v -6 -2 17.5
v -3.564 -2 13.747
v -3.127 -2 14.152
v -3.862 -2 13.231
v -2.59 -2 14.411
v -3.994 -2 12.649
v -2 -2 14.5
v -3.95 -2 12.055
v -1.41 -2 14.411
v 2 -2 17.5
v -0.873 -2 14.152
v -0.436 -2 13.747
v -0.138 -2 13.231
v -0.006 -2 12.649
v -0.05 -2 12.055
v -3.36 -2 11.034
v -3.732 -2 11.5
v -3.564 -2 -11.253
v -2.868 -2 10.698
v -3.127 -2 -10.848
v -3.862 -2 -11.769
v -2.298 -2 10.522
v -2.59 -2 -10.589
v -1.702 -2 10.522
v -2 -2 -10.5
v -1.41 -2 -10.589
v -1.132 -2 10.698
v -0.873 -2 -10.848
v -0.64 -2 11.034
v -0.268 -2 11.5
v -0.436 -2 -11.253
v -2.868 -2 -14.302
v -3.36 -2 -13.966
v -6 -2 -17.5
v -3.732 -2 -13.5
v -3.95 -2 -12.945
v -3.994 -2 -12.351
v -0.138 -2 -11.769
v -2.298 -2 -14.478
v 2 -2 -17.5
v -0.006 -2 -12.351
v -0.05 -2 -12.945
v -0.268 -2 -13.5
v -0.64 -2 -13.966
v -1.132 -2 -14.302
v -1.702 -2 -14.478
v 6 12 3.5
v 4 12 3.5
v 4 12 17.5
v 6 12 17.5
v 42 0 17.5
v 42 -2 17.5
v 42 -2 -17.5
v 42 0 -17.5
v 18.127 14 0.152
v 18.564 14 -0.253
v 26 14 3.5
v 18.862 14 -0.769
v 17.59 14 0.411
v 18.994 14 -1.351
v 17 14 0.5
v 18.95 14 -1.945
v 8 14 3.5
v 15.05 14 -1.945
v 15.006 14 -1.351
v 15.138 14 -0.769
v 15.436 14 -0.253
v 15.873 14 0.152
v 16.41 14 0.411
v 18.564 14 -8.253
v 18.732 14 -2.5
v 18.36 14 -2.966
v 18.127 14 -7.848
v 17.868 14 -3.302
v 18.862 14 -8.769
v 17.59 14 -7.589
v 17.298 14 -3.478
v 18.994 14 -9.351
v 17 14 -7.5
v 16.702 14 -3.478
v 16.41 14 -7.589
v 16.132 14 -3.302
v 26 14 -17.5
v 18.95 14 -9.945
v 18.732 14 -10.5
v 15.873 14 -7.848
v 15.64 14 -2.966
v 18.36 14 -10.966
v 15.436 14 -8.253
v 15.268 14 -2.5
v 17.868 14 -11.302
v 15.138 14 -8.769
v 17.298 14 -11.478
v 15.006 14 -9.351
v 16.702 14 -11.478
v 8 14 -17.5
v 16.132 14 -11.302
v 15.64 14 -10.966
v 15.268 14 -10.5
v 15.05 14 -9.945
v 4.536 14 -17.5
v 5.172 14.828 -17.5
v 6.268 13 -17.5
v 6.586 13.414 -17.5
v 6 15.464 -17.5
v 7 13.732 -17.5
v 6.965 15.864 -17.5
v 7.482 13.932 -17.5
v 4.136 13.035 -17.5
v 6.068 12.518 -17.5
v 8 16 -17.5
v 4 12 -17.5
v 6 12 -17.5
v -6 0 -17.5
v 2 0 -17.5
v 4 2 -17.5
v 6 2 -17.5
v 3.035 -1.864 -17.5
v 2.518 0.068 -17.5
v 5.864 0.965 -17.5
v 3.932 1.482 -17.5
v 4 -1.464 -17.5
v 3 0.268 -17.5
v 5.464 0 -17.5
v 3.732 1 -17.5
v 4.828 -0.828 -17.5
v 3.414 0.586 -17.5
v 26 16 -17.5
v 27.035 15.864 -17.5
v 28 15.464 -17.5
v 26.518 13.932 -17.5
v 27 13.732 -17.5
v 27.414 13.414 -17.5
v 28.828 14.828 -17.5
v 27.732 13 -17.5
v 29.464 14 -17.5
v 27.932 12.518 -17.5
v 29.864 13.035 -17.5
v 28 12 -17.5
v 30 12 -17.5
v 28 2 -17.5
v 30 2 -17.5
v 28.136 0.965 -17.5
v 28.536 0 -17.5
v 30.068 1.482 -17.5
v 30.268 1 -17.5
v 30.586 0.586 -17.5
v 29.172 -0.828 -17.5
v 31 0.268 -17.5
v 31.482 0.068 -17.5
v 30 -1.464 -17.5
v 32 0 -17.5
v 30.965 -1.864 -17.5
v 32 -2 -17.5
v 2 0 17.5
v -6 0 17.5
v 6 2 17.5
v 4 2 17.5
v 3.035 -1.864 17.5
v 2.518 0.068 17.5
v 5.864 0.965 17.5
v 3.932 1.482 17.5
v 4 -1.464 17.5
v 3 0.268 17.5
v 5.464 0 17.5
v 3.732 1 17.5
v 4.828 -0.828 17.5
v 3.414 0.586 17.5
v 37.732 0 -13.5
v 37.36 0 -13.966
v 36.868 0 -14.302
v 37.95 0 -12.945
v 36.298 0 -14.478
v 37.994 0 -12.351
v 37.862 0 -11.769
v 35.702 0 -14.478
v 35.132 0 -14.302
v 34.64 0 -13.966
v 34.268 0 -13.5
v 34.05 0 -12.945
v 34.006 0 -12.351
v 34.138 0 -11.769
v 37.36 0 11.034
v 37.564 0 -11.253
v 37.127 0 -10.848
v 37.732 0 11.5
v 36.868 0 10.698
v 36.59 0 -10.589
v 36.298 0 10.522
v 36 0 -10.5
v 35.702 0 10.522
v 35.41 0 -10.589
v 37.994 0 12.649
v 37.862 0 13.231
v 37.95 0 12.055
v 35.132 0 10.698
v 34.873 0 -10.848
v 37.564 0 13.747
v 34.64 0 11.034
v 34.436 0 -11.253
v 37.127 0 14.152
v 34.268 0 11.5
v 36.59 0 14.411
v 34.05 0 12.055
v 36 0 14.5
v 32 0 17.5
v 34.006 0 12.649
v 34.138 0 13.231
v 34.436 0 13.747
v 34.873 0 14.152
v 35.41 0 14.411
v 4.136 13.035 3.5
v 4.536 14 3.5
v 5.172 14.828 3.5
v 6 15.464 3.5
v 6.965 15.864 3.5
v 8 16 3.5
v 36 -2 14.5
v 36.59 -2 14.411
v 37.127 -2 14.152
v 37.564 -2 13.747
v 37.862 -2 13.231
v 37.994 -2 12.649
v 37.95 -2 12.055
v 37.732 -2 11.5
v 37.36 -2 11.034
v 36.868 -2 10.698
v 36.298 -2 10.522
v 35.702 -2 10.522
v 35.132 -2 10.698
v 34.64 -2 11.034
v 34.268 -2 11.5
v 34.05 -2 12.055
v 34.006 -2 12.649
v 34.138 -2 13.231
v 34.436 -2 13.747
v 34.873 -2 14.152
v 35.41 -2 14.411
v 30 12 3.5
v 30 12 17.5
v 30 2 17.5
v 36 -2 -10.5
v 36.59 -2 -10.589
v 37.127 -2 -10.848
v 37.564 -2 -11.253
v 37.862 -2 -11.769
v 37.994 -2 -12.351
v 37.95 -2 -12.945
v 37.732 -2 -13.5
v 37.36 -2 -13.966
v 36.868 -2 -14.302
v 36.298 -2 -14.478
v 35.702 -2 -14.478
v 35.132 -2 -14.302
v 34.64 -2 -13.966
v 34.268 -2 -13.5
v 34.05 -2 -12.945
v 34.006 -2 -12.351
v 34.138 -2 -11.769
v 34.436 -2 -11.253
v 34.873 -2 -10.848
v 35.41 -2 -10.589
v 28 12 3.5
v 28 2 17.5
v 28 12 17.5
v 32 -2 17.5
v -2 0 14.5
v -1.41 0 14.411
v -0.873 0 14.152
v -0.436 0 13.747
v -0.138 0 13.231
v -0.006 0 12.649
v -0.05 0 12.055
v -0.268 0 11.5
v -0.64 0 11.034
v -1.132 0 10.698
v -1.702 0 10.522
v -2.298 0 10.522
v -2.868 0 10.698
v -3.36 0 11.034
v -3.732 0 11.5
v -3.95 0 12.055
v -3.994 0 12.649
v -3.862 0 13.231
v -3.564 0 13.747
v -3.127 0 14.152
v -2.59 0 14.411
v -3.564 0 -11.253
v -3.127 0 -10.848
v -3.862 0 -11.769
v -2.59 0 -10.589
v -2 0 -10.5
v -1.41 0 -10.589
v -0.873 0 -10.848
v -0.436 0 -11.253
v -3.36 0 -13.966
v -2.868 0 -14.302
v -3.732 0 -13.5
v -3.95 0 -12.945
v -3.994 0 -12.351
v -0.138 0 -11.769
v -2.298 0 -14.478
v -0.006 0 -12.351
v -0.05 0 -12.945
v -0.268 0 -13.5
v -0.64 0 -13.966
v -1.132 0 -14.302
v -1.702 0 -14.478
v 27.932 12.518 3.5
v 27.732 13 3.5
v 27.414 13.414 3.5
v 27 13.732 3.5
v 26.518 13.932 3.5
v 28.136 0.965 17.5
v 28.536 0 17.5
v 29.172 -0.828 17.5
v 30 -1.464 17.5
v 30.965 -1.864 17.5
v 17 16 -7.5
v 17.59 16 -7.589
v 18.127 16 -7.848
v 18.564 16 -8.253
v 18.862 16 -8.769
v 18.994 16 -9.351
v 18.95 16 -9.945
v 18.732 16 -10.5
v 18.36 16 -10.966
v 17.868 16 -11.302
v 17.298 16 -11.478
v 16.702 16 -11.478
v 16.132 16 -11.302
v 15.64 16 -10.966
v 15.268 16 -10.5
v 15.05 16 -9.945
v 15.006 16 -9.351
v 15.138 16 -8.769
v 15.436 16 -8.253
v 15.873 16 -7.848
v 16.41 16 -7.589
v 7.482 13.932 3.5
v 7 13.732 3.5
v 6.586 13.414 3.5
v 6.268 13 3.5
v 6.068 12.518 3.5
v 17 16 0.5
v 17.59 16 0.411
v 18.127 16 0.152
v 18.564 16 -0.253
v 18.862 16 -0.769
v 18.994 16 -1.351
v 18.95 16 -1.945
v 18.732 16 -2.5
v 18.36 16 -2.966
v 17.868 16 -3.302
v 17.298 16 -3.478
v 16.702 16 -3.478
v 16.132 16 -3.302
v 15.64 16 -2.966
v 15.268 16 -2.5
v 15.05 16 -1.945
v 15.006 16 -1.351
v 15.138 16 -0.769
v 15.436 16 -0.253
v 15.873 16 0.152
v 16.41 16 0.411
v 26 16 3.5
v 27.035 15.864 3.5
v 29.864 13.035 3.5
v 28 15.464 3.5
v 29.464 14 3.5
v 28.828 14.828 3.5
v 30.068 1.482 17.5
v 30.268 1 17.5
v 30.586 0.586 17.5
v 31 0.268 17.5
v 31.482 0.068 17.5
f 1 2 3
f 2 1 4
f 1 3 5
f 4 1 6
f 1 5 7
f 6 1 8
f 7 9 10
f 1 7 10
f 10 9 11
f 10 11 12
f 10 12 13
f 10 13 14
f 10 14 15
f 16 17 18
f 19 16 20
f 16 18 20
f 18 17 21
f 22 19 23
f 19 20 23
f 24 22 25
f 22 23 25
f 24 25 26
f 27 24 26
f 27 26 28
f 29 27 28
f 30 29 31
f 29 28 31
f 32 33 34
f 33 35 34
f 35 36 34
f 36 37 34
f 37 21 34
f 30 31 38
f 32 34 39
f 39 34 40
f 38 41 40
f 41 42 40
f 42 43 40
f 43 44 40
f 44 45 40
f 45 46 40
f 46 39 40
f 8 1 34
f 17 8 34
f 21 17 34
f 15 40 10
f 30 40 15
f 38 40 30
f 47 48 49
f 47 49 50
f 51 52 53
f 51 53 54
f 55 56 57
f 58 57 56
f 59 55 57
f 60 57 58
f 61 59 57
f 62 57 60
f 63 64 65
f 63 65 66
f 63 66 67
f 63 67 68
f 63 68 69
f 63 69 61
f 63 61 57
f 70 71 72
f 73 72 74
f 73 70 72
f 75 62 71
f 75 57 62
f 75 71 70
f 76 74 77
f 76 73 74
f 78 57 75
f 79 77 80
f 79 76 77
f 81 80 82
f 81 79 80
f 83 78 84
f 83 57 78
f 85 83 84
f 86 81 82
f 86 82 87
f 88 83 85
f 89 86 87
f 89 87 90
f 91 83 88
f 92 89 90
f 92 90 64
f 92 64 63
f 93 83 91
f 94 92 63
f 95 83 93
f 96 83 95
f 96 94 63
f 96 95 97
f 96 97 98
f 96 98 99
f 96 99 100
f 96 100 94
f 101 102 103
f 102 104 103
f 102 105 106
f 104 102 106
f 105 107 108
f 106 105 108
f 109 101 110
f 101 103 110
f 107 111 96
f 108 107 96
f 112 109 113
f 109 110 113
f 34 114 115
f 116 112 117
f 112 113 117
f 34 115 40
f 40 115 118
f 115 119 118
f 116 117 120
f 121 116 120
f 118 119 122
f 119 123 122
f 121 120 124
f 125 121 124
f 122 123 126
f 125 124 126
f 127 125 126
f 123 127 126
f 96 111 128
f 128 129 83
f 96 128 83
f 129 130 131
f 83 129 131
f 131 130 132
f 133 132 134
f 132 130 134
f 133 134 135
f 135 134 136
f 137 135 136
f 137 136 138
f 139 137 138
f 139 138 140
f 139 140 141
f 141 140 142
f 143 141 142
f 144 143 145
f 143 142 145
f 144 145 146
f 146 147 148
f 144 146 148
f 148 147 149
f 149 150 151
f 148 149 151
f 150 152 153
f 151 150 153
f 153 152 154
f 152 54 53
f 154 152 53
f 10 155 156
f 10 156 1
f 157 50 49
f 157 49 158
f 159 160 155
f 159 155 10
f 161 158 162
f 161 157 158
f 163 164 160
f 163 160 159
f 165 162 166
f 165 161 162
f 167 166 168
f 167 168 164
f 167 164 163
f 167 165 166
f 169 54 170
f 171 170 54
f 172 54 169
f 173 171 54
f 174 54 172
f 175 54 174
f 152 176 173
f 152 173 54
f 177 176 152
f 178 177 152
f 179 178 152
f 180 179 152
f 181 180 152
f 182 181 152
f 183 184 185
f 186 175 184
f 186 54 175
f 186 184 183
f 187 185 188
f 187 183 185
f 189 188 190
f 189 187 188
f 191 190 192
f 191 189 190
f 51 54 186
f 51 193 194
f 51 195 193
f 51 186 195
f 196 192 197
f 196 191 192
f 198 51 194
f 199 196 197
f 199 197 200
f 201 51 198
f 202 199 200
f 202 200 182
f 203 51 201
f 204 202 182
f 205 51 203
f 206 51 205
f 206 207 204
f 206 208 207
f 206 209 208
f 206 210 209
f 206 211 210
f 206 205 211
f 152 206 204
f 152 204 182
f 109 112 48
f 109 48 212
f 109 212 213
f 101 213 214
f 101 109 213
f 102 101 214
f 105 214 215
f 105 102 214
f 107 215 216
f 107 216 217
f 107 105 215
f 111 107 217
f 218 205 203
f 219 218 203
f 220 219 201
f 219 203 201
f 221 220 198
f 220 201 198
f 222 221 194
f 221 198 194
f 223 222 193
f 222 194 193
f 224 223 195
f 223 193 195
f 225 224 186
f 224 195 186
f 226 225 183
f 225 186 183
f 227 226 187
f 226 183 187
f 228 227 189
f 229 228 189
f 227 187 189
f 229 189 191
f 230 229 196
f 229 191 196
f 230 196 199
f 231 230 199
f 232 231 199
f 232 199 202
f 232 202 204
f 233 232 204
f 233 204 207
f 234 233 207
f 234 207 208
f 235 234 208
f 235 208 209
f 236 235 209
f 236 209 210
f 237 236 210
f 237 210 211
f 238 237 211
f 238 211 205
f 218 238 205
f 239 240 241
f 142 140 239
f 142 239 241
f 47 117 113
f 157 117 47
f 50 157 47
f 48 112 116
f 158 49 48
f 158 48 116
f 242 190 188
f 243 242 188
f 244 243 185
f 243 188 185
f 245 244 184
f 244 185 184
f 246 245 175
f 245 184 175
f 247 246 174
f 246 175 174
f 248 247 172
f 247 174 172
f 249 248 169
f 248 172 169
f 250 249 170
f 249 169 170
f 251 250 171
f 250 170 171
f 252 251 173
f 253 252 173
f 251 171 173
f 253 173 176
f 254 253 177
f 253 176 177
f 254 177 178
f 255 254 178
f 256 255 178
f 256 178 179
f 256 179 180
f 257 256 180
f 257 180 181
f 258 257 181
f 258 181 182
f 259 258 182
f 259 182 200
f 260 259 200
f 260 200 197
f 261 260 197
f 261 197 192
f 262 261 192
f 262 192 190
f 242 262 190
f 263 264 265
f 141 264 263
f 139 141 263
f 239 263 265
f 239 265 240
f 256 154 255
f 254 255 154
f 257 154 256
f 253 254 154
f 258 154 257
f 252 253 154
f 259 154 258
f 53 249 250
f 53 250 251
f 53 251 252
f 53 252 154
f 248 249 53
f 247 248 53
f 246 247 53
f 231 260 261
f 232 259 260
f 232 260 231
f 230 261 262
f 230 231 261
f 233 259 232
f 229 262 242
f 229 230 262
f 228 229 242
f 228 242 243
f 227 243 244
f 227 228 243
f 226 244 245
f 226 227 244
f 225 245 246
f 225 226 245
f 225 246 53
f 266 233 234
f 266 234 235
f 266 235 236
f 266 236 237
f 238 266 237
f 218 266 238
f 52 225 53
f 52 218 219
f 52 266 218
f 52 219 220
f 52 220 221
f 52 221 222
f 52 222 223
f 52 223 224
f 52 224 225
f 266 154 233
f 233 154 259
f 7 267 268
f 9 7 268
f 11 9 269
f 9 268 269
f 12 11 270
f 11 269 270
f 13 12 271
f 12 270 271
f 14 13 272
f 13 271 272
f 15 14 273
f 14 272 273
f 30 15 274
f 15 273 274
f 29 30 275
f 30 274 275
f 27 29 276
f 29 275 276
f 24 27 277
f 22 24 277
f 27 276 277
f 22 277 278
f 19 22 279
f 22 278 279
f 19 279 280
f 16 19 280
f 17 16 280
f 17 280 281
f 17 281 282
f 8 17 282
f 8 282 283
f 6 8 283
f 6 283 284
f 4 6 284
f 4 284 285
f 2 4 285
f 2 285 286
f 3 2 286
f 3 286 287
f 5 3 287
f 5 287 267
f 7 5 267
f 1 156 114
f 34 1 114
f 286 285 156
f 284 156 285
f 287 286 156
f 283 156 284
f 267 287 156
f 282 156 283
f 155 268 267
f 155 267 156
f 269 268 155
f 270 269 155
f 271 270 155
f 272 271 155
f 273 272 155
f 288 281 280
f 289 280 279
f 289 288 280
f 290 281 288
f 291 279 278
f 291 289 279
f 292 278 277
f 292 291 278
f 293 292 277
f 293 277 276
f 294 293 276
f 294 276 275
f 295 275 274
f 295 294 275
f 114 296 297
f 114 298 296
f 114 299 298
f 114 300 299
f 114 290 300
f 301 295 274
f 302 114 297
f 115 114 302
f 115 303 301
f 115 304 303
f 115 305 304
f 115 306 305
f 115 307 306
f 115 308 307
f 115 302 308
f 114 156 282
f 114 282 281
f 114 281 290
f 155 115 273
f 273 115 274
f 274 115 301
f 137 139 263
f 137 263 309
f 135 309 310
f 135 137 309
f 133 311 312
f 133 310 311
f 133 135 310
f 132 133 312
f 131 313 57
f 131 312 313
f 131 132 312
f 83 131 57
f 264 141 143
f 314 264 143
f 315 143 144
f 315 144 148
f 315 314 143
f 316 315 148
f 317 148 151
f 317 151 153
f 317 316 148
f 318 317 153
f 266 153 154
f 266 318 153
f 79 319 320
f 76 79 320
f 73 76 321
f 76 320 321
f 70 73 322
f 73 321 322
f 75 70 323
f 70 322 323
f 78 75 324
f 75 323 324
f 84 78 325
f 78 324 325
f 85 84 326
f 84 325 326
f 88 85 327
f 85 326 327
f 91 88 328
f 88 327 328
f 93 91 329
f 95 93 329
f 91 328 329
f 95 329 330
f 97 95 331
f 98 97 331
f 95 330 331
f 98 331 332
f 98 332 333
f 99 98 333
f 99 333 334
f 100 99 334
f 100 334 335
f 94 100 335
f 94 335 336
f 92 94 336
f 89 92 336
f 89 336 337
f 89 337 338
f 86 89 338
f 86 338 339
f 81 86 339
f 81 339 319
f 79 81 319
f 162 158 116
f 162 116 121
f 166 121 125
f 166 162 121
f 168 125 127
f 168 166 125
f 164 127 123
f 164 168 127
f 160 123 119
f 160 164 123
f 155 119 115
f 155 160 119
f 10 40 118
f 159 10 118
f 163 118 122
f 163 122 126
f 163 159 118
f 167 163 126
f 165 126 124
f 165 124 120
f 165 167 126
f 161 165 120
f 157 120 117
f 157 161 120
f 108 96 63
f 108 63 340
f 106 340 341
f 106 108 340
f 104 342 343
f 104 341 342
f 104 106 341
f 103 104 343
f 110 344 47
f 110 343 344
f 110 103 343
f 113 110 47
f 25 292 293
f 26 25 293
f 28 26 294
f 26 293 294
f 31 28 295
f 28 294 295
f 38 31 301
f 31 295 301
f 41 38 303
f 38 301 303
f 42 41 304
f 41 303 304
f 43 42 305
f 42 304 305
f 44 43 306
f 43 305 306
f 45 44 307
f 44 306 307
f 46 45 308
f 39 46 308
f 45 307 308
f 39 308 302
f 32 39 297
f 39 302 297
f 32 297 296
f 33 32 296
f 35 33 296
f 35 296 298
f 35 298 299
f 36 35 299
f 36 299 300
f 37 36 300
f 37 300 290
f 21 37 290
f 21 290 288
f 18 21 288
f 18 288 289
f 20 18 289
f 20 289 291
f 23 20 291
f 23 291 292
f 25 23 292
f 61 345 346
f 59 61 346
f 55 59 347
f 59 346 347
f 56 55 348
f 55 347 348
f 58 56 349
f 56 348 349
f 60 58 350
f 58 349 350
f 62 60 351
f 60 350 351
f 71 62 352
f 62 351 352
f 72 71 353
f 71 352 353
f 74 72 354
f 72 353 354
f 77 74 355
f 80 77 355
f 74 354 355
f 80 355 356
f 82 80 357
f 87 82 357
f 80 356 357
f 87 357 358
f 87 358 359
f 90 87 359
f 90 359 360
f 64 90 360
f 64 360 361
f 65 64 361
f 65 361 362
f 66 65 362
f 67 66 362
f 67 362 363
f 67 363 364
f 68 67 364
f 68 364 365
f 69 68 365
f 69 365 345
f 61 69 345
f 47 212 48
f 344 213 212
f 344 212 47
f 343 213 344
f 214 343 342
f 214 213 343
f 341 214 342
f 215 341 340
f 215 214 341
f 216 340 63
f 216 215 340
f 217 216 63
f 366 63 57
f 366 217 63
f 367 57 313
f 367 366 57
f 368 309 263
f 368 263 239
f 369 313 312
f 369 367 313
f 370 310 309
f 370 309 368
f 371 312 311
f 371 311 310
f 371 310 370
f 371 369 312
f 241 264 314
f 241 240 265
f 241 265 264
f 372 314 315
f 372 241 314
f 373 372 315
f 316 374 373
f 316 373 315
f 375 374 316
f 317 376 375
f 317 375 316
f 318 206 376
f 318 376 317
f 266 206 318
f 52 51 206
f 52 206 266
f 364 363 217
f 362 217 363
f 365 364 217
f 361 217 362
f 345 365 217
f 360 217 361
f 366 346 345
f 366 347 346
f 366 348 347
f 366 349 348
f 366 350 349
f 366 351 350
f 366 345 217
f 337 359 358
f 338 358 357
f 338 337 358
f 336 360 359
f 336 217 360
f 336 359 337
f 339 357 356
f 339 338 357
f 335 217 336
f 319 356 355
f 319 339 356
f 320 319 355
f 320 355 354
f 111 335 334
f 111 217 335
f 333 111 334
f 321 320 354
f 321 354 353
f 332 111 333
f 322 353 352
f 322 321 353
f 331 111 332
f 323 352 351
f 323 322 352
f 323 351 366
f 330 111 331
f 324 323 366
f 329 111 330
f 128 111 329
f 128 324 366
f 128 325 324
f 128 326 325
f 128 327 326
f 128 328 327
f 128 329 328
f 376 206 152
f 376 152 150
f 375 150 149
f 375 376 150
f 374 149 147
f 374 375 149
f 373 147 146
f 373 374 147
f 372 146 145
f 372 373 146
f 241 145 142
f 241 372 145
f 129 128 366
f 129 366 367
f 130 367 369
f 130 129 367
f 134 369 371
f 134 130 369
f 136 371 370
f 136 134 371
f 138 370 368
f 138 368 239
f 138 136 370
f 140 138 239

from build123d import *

# Parameters (mm, degrees)
SKETCH1_W                    = 12
SKETCH1_H                    = 35
BASE_FLANGE1_DEPTH           = 2
EDGE_FLANGE1_STRIP_W         = 12
EDGE_FLANGE1_STRIP_H         = 2
EDGE_FLANGE1_STRIP_CUT_DEPTH = 35
EDGE_FLANGE1_DEPTH           = 35
EDGE_FLANGE2_STRIP_W         = 12
EDGE_FLANGE2_STRIP_H         = 2
EDGE_FLANGE2_STRIP_CUT_DEPTH = 35
EDGE_FLANGE2_DEPTH           = 35
EDGE_FLANGE3_STRIP_W         = 12
EDGE_FLANGE3_STRIP_H         = 2
EDGE_FLANGE3_STRIP_CUT_DEPTH = 35
EDGE_FLANGE3_DEPTH           = 35
EDGE_FLANGE4_STRIP_W         = 12
EDGE_FLANGE4_STRIP_H         = 2
EDGE_FLANGE4_STRIP_CUT_DEPTH = 35
EDGE_FLANGE4_DEPTH           = 35
SKETCH18_W                   = 30
SKETCH18_H                   = 14
CUT_EXTRUDE1_DEPTH           = 4
SKETCH19_R                   = 2
CUT_EXTRUDE2_DEPTH           = 49.231213959
SKETCH20_R                   = 2
CUT_EXTRUDE4_DEPTH           = 49.931073971


# Sheet-metal steps are written as plain solids
with BuildPart() as part:
    # Sketch1 → Base-Flange1 (new body)
    with BuildSketch(Plane(origin=(0, 0, 0), x_dir=(1, 0, 0), z_dir=(0, 1, 0))):
        Rectangle(SKETCH1_W, SKETCH1_H)
    extrude(amount=-BASE_FLANGE1_DEPTH)

    # Edge-Flange1 strip (across the edge) → Edge-Flange1 strip cut (cut)
    with BuildSketch(Plane(origin=(6, 0, 17.5), x_dir=(-1, 0, 0), z_dir=(0, 0, -1))):
        with Locations((-2, -1)):
            Rectangle(EDGE_FLANGE1_STRIP_W, EDGE_FLANGE1_STRIP_H)
    extrude(amount=EDGE_FLANGE1_STRIP_CUT_DEPTH, mode=Mode.SUBTRACT)

    # Edge-Flange1 section (across the edge) → Edge-Flange1 (add)
    with BuildSketch(Plane(origin=(6, 0, 17.5), x_dir=(-1, 0, 0), z_dir=(0, 0, -1))):
        with BuildLine():
            Line((0, 2), (0, 16))
            Line((0, 16), (2, 16))
            Line((2, 16), (2, 2))
            ThreePointArc((2, 2), (2.585786438, 0.585786438), (4, 0))
            Line((4, 0), (4, -2))
            ThreePointArc((4, -2), (1.171572875, -0.828427125), (0, 2))
        make_face()
    extrude(amount=EDGE_FLANGE1_DEPTH)

    # Edge-Flange2 strip (across the edge) → Edge-Flange2 strip cut (cut)
    with BuildSketch(Plane(origin=(6, 16, -17.5), x_dir=(0, -1, 0), z_dir=(0, 0, 1))):
        with Locations((-2, -1)):
            Rectangle(EDGE_FLANGE2_STRIP_W, EDGE_FLANGE2_STRIP_H)
    extrude(amount=EDGE_FLANGE2_STRIP_CUT_DEPTH, mode=Mode.SUBTRACT)

    # Edge-Flange2 section (across the edge) → Edge-Flange2 (add)
    with BuildSketch(Plane(origin=(6, 16, -17.5), x_dir=(0, -1, 0), z_dir=(0, 0, 1))):
        with BuildLine():
            Line((0, 2), (0, 24))
            Line((0, 24), (2, 24))
            Line((2, 24), (2, 2))
            ThreePointArc((2, 2), (2.585786438, 0.585786438), (4, 0))
            Line((4, 0), (4, -2))
            ThreePointArc((4, -2), (1.171572875, -0.828427125), (0, 2))
        make_face()
    extrude(amount=EDGE_FLANGE2_DEPTH)

    # Edge-Flange3 strip (across the edge) → Edge-Flange3 strip cut (cut)
    with BuildSketch(Plane(origin=(30, 14, -17.5), x_dir=(-1, 0, 0), z_dir=(0, 0, 1))):
        with Locations((-2, -1)):
            Rectangle(EDGE_FLANGE3_STRIP_W, EDGE_FLANGE3_STRIP_H)
    extrude(amount=EDGE_FLANGE3_STRIP_CUT_DEPTH, mode=Mode.SUBTRACT)

    # Edge-Flange3 section (across the edge) → Edge-Flange3 (add)
    with BuildSketch(Plane(origin=(30, 14, -17.5), x_dir=(-1, 0, 0), z_dir=(0, 0, 1))):
        with BuildLine():
            Line((0, 2), (0, 16))
            Line((0, 16), (2, 16))
            Line((2, 16), (2, 2))
            ThreePointArc((2, 2), (2.585786438, 0.585786438), (4, 0))
            Line((4, 0), (4, -2))
            ThreePointArc((4, -2), (1.171572875, -0.828427125), (0, 2))
        make_face()
    extrude(amount=EDGE_FLANGE3_DEPTH)

    # Edge-Flange4 strip (across the edge) → Edge-Flange4 strip cut (cut)
    with BuildSketch(Plane(origin=(30, -2, 17.5), x_dir=(0, 1, 0), z_dir=(0, 0, -1))):
        with Locations((-2, -1)):
            Rectangle(EDGE_FLANGE4_STRIP_W, EDGE_FLANGE4_STRIP_H)
    extrude(amount=EDGE_FLANGE4_STRIP_CUT_DEPTH, mode=Mode.SUBTRACT)

    # Edge-Flange4 section (across the edge) → Edge-Flange4 (add)
    with BuildSketch(Plane(origin=(30, -2, 17.5), x_dir=(0, 1, 0), z_dir=(0, 0, -1))):
        with BuildLine():
            Line((0, 2), (0, 12))
            Line((0, 12), (2, 12))
            Line((2, 12), (2, 2))
            ThreePointArc((2, 2), (2.585786438, 0.585786438), (4, 0))
            Line((4, 0), (4, -2))
            ThreePointArc((4, -2), (1.171572875, -0.828427125), (0, 2))
        make_face()
    extrude(amount=EDGE_FLANGE4_DEPTH)

    # Sketch18 → Cut-Extrude1 (cut)
    with BuildSketch(Plane(origin=(0, 16, 0), x_dir=(1, 0, 0), z_dir=(0, 1, 0))):
        with Locations((17, -10.5)):
            Rectangle(SKETCH18_W, SKETCH18_H)
    extrude(amount=-CUT_EXTRUDE1_DEPTH, mode=Mode.SUBTRACT)

    # Sketch19 → Cut-Extrude2 (cut, through all)
    with BuildSketch(Plane(origin=(0, 0, 0), x_dir=(1, 0, 0), z_dir=(0, 1, 0))):
        with Locations(Location((-2, 12.5, 0), (0, 0, 270))):
            Circle(SKETCH19_R)
        with Locations(Location((-2, -12.5, 0), (0, 0, 270))):
            Circle(SKETCH19_R)
        with Locations(Location((36, 12.5, 0), (0, 0, 270))):
            Circle(SKETCH19_R)
        with Locations(Location((36, -12.5, 0), (0, 0, 270))):
            Circle(SKETCH19_R)
    extrude(amount=-CUT_EXTRUDE2_DEPTH, mode=Mode.SUBTRACT)

    # Sketch20 → Cut-Extrude4 (cut, through all)
    with BuildSketch(Plane(origin=(0, 16, 0), x_dir=(1, 0, 0), z_dir=(0, 1, 0))):
        with Locations(Location((17, 9.5, 0), (0, 0, 270))):
            Circle(SKETCH20_R)
        with Locations(Location((17, 1.5, 0), (0, 0, 270))):
            Circle(SKETCH20_R)
    extrude(amount=-CUT_EXTRUDE4_DEPTH, mode=Mode.SUBTRACT)


solid = part.part
